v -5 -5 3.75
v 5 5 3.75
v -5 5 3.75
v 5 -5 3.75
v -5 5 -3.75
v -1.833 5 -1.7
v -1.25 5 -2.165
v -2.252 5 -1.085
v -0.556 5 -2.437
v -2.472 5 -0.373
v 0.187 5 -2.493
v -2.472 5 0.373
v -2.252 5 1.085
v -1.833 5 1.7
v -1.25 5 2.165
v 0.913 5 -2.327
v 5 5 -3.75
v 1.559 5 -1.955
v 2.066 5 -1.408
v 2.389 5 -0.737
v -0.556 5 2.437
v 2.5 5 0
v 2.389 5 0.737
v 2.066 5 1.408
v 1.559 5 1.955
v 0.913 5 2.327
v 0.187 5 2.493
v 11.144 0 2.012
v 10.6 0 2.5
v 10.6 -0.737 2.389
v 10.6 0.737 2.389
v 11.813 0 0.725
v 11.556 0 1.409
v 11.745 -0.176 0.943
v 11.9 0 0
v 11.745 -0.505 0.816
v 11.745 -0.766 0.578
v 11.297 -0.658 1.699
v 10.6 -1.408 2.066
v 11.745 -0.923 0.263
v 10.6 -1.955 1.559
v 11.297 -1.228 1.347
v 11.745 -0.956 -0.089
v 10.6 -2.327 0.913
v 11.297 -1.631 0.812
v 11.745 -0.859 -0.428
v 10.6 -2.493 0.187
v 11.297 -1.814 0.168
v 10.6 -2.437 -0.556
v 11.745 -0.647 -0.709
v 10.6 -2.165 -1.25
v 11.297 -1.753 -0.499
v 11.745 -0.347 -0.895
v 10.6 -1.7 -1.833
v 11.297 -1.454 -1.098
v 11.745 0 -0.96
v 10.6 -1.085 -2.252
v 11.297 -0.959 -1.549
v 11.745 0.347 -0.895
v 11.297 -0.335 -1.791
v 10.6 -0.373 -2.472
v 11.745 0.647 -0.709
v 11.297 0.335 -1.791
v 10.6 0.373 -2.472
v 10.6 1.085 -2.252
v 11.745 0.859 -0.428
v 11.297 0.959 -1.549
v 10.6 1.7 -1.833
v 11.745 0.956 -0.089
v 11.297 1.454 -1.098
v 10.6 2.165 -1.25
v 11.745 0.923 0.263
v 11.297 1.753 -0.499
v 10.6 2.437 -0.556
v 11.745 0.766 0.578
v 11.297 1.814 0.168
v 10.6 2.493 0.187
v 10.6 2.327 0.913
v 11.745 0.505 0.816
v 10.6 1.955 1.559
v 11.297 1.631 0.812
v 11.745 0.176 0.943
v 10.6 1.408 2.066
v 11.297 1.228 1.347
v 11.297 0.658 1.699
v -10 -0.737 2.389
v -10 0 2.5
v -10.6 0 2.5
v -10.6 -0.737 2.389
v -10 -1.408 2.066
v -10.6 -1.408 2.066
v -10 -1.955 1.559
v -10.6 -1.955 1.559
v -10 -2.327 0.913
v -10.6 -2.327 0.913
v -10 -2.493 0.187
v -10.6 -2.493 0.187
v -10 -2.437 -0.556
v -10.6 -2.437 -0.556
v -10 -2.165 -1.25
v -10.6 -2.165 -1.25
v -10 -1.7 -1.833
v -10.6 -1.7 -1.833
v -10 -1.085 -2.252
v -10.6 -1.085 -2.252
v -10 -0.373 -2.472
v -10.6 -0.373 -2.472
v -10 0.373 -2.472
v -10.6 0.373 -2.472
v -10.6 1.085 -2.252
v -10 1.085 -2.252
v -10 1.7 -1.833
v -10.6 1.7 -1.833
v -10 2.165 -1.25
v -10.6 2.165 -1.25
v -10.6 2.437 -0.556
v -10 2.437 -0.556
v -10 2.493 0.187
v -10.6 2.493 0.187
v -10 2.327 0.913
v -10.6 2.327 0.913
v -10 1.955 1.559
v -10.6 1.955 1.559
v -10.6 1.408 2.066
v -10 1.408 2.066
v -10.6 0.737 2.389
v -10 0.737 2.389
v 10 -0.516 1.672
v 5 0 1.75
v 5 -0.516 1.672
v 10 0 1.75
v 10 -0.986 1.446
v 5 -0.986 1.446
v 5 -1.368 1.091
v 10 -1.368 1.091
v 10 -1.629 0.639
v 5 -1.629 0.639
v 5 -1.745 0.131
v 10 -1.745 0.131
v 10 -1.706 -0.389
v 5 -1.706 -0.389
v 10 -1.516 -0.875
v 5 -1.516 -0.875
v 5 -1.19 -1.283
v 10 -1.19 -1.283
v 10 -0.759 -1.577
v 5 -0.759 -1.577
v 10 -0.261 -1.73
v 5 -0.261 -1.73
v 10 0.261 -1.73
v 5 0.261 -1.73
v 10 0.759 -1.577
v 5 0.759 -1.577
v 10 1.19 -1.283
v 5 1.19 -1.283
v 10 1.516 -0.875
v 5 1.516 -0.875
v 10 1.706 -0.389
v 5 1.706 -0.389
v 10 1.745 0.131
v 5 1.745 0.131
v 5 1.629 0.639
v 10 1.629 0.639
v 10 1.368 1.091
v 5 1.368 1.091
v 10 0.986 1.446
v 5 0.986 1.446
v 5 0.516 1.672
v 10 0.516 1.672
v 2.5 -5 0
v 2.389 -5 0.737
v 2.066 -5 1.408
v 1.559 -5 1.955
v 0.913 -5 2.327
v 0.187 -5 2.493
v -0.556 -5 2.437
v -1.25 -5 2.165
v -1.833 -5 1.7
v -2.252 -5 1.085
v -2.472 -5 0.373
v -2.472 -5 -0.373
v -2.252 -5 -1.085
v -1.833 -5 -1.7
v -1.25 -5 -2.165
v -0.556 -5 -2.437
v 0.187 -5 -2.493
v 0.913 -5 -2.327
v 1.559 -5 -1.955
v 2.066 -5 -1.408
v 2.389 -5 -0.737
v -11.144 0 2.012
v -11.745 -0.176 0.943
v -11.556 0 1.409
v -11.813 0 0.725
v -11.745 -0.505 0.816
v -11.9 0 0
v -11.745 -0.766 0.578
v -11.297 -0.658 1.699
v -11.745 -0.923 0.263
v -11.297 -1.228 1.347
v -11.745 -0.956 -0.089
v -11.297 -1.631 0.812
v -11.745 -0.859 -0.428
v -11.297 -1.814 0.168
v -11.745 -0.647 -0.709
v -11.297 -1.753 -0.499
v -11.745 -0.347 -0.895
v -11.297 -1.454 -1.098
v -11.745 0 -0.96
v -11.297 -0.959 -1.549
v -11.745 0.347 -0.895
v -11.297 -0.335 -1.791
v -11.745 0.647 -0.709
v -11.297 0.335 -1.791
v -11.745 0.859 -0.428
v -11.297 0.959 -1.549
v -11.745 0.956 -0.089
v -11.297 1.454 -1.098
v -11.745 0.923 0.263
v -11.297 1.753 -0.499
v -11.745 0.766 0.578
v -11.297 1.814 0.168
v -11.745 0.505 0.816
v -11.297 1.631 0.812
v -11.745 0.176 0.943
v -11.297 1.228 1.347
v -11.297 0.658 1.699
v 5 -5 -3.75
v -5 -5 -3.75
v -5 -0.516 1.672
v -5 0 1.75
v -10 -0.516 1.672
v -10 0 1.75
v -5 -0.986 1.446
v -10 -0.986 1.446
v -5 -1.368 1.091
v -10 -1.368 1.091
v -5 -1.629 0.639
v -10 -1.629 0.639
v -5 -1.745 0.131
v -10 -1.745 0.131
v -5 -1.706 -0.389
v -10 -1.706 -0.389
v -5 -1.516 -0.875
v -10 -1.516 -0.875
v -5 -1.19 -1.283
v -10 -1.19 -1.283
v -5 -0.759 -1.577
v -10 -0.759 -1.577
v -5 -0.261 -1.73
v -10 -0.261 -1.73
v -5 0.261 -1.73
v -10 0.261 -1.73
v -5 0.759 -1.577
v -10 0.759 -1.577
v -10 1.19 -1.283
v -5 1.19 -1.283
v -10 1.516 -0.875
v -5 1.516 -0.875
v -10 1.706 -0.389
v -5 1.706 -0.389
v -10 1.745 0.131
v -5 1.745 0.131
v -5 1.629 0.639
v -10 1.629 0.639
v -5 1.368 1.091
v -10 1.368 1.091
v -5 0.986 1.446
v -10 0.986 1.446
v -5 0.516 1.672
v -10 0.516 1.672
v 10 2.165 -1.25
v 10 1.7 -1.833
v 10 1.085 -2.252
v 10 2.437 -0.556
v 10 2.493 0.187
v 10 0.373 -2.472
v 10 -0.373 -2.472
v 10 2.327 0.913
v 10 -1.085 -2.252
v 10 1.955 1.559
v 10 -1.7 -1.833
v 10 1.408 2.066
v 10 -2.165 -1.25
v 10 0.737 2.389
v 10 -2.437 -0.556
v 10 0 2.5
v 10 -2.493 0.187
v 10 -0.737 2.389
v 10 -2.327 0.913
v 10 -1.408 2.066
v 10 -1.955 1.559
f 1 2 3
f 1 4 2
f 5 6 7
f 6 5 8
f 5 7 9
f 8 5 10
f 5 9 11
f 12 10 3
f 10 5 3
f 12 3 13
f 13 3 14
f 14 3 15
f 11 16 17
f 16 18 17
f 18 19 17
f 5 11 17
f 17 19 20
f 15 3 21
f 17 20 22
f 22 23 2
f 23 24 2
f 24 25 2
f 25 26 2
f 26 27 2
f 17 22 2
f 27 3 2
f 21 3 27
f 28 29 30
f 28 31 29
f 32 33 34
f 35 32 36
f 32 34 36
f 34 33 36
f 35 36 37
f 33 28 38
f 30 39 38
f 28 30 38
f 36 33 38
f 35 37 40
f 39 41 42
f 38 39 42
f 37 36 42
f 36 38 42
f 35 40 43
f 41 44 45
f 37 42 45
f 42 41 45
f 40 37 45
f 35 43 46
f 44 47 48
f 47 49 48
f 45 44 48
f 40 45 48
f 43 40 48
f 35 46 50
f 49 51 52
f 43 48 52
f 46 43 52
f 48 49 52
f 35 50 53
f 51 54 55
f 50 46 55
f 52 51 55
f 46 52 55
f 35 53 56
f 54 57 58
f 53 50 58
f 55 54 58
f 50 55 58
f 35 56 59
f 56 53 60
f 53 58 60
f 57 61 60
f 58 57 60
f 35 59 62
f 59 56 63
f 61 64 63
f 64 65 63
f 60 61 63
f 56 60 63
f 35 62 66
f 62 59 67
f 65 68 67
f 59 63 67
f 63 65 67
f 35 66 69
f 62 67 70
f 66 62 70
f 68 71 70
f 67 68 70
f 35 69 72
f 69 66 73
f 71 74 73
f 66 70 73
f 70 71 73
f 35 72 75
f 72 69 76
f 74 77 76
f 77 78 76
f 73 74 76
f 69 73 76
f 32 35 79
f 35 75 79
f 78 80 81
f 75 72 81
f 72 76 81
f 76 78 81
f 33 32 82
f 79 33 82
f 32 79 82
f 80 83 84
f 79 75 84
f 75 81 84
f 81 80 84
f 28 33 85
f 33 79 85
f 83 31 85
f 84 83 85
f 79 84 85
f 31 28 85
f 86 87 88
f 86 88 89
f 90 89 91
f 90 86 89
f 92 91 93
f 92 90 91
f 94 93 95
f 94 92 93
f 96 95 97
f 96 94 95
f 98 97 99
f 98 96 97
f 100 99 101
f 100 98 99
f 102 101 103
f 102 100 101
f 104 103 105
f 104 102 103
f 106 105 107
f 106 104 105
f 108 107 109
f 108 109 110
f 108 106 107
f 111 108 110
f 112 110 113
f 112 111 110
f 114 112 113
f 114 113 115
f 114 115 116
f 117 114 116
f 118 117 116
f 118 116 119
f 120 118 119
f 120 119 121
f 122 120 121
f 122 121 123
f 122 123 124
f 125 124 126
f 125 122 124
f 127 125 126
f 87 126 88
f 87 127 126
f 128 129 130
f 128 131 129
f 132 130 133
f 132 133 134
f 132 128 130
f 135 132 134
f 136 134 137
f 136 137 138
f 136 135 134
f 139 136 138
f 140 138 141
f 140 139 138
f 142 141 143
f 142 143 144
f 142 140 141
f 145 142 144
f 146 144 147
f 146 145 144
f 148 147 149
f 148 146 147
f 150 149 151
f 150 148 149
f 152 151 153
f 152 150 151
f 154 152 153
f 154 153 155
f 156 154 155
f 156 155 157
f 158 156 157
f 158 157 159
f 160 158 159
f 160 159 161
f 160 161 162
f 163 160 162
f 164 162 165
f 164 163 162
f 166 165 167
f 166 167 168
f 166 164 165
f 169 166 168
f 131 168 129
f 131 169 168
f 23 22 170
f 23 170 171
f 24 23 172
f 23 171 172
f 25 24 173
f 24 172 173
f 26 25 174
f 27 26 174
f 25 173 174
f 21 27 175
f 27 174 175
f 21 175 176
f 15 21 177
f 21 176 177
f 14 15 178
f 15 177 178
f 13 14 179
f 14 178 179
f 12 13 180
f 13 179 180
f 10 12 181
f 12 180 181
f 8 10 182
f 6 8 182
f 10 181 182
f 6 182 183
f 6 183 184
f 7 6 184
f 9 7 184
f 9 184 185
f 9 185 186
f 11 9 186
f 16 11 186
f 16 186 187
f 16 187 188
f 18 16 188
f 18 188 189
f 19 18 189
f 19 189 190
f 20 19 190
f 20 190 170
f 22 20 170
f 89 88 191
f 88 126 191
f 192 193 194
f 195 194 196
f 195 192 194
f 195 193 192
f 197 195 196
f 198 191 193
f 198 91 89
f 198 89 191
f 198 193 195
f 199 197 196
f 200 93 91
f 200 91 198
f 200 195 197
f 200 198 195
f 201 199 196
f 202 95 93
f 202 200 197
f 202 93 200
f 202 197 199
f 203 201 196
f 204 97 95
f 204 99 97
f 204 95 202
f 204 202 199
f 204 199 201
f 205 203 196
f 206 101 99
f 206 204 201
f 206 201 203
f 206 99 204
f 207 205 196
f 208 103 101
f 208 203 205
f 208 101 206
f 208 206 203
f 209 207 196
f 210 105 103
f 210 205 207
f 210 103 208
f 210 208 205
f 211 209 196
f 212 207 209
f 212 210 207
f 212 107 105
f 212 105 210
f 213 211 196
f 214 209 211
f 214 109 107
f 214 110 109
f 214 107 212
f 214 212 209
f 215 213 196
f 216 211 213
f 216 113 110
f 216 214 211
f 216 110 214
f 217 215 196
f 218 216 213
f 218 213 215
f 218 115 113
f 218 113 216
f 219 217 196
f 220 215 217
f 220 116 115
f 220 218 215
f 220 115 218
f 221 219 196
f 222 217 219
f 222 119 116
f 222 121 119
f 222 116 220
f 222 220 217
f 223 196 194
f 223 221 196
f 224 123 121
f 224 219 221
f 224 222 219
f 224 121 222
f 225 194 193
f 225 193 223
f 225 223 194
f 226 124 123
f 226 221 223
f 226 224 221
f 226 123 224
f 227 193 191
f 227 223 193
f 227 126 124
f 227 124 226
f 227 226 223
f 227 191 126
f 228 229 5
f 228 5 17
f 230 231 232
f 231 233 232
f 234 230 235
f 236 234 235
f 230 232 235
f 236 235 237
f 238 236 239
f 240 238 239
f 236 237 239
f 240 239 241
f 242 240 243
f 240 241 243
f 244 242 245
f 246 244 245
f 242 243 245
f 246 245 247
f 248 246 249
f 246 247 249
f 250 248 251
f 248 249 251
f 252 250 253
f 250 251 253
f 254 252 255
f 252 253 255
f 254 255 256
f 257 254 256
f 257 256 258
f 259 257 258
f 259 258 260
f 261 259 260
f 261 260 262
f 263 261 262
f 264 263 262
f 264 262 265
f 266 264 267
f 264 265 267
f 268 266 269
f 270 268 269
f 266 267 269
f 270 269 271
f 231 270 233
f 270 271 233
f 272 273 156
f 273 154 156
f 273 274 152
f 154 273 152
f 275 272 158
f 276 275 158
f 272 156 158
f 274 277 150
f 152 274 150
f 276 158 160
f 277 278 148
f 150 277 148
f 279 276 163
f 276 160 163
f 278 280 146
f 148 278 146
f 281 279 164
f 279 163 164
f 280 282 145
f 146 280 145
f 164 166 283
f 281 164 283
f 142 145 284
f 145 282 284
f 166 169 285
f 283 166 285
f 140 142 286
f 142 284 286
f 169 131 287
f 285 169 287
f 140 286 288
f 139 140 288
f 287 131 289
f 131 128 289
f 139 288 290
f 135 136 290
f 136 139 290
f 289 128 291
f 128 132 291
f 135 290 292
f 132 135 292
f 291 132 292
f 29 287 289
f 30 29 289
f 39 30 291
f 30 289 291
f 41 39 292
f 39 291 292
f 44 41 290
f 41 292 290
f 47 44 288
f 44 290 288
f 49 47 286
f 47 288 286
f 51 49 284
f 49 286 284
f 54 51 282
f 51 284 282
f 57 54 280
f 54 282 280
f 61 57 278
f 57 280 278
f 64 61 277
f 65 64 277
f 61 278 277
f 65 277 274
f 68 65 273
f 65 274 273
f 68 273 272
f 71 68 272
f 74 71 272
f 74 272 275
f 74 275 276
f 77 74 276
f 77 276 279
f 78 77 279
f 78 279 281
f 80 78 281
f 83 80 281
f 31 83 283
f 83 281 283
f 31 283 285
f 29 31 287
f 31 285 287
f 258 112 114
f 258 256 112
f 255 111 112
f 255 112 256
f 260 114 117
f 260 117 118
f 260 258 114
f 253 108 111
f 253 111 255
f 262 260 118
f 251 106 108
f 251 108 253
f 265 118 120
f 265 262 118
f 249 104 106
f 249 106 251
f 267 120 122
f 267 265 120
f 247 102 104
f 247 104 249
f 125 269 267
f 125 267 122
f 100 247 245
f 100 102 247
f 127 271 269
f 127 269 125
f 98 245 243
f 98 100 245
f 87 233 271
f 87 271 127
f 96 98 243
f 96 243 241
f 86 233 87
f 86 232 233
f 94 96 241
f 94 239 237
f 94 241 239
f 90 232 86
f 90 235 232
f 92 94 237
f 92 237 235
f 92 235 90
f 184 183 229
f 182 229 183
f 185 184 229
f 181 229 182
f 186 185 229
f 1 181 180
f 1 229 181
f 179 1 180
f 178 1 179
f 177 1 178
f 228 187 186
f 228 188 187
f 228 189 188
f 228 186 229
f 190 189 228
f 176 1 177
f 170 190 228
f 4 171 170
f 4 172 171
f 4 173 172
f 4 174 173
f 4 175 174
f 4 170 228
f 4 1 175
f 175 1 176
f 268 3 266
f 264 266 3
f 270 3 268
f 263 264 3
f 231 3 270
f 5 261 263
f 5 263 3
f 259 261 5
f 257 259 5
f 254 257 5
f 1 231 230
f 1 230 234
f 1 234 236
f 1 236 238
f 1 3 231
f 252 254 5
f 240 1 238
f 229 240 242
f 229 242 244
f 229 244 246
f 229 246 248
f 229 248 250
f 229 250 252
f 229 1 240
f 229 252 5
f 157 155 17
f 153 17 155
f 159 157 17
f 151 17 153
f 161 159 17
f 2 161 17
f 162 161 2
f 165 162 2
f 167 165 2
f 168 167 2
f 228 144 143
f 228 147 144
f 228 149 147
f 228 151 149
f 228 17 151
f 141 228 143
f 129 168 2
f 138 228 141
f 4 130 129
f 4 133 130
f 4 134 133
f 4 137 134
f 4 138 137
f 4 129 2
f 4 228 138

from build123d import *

# Parameters (mm, degrees)
F1_DEPTH = 5
F0_W     = 5
F0_H     = 1.75
F5_R     = 2.5
F6_DEPTH = 25


# Not quite as in the source:
# - a pattern or mirror of a feature is missing from the dataset's text; its kind, count and spacing are read off the source's solid
# - a feature names something its author has since deleted; it is built from what else it names


with BuildPart() as f1:
    # F0 (on Front) → F1 (new body, symmetric)
    with BuildSketch(Plane.XZ):
        Polygon((5, 1.75), (5, 3.75), (-5, 3.75), (-5, -3.75), (5, -3.75), (5, 0), align=None)
    extrude(amount=F1_DEPTH, both=True)

    # F0 (on Front) → F2 (revolve)
    with BuildSketch(Plane.XZ):
        with Locations((7.5, 0.875)):
            Rectangle(F0_W, F0_H)
    f2 = revolve(axis=Axis((7.5, 0, 0), (1, 0, 0)))

    # F2_copies: F2 across plane
    add(f2.mirror(Plane(origin=(0, 0, 0), x_dir=(0, 0, -1), z_dir=(-1, 0, 0))))

    # F0 (on Front) → F3 (revolve)
    with BuildSketch(Plane.XZ):
        Polygon((10, 2.5), (10, 1.75), (10, 0), (10.6, 0), (10.6, 2.5), align=None)
    f3 = revolve(axis=Axis((12.1656447835, 0, 0), (1, 0, 0)))

    # F3_copies: F3 across plane
    add(f3.mirror(Plane(origin=(0, 0, 0), x_dir=(0, 0, -1), z_dir=(-1, 0, 0))))

    # F0 (on Front) → F4 (revolve)
    with BuildSketch(Plane.XZ):
        with BuildLine():
            Line((10.6, 2.5), (10.6, 0))
            Line((10.6, 0), (11.9, 0))
            ThreePointArc((11.9, 0), (11.5555774622, 1.4089002804), (10.6, 2.5))
        make_face()
    f4 = revolve(axis=Axis((12.1656447835, 0, 0), (1, 0, 0)))

    # F4_copies: F4 across plane
    add(f4.mirror(Plane(origin=(0, 0, 0), x_dir=(0, 0, -1), z_dir=(-1, 0, 0))))

    # F5 (on face) → F6 (cut)
    with BuildSketch(Plane.XZ.offset(5)):
        Circle(F5_R)
    extrude(amount=-F6_DEPTH, mode=Mode.SUBTRACT)


solid = f1.part
